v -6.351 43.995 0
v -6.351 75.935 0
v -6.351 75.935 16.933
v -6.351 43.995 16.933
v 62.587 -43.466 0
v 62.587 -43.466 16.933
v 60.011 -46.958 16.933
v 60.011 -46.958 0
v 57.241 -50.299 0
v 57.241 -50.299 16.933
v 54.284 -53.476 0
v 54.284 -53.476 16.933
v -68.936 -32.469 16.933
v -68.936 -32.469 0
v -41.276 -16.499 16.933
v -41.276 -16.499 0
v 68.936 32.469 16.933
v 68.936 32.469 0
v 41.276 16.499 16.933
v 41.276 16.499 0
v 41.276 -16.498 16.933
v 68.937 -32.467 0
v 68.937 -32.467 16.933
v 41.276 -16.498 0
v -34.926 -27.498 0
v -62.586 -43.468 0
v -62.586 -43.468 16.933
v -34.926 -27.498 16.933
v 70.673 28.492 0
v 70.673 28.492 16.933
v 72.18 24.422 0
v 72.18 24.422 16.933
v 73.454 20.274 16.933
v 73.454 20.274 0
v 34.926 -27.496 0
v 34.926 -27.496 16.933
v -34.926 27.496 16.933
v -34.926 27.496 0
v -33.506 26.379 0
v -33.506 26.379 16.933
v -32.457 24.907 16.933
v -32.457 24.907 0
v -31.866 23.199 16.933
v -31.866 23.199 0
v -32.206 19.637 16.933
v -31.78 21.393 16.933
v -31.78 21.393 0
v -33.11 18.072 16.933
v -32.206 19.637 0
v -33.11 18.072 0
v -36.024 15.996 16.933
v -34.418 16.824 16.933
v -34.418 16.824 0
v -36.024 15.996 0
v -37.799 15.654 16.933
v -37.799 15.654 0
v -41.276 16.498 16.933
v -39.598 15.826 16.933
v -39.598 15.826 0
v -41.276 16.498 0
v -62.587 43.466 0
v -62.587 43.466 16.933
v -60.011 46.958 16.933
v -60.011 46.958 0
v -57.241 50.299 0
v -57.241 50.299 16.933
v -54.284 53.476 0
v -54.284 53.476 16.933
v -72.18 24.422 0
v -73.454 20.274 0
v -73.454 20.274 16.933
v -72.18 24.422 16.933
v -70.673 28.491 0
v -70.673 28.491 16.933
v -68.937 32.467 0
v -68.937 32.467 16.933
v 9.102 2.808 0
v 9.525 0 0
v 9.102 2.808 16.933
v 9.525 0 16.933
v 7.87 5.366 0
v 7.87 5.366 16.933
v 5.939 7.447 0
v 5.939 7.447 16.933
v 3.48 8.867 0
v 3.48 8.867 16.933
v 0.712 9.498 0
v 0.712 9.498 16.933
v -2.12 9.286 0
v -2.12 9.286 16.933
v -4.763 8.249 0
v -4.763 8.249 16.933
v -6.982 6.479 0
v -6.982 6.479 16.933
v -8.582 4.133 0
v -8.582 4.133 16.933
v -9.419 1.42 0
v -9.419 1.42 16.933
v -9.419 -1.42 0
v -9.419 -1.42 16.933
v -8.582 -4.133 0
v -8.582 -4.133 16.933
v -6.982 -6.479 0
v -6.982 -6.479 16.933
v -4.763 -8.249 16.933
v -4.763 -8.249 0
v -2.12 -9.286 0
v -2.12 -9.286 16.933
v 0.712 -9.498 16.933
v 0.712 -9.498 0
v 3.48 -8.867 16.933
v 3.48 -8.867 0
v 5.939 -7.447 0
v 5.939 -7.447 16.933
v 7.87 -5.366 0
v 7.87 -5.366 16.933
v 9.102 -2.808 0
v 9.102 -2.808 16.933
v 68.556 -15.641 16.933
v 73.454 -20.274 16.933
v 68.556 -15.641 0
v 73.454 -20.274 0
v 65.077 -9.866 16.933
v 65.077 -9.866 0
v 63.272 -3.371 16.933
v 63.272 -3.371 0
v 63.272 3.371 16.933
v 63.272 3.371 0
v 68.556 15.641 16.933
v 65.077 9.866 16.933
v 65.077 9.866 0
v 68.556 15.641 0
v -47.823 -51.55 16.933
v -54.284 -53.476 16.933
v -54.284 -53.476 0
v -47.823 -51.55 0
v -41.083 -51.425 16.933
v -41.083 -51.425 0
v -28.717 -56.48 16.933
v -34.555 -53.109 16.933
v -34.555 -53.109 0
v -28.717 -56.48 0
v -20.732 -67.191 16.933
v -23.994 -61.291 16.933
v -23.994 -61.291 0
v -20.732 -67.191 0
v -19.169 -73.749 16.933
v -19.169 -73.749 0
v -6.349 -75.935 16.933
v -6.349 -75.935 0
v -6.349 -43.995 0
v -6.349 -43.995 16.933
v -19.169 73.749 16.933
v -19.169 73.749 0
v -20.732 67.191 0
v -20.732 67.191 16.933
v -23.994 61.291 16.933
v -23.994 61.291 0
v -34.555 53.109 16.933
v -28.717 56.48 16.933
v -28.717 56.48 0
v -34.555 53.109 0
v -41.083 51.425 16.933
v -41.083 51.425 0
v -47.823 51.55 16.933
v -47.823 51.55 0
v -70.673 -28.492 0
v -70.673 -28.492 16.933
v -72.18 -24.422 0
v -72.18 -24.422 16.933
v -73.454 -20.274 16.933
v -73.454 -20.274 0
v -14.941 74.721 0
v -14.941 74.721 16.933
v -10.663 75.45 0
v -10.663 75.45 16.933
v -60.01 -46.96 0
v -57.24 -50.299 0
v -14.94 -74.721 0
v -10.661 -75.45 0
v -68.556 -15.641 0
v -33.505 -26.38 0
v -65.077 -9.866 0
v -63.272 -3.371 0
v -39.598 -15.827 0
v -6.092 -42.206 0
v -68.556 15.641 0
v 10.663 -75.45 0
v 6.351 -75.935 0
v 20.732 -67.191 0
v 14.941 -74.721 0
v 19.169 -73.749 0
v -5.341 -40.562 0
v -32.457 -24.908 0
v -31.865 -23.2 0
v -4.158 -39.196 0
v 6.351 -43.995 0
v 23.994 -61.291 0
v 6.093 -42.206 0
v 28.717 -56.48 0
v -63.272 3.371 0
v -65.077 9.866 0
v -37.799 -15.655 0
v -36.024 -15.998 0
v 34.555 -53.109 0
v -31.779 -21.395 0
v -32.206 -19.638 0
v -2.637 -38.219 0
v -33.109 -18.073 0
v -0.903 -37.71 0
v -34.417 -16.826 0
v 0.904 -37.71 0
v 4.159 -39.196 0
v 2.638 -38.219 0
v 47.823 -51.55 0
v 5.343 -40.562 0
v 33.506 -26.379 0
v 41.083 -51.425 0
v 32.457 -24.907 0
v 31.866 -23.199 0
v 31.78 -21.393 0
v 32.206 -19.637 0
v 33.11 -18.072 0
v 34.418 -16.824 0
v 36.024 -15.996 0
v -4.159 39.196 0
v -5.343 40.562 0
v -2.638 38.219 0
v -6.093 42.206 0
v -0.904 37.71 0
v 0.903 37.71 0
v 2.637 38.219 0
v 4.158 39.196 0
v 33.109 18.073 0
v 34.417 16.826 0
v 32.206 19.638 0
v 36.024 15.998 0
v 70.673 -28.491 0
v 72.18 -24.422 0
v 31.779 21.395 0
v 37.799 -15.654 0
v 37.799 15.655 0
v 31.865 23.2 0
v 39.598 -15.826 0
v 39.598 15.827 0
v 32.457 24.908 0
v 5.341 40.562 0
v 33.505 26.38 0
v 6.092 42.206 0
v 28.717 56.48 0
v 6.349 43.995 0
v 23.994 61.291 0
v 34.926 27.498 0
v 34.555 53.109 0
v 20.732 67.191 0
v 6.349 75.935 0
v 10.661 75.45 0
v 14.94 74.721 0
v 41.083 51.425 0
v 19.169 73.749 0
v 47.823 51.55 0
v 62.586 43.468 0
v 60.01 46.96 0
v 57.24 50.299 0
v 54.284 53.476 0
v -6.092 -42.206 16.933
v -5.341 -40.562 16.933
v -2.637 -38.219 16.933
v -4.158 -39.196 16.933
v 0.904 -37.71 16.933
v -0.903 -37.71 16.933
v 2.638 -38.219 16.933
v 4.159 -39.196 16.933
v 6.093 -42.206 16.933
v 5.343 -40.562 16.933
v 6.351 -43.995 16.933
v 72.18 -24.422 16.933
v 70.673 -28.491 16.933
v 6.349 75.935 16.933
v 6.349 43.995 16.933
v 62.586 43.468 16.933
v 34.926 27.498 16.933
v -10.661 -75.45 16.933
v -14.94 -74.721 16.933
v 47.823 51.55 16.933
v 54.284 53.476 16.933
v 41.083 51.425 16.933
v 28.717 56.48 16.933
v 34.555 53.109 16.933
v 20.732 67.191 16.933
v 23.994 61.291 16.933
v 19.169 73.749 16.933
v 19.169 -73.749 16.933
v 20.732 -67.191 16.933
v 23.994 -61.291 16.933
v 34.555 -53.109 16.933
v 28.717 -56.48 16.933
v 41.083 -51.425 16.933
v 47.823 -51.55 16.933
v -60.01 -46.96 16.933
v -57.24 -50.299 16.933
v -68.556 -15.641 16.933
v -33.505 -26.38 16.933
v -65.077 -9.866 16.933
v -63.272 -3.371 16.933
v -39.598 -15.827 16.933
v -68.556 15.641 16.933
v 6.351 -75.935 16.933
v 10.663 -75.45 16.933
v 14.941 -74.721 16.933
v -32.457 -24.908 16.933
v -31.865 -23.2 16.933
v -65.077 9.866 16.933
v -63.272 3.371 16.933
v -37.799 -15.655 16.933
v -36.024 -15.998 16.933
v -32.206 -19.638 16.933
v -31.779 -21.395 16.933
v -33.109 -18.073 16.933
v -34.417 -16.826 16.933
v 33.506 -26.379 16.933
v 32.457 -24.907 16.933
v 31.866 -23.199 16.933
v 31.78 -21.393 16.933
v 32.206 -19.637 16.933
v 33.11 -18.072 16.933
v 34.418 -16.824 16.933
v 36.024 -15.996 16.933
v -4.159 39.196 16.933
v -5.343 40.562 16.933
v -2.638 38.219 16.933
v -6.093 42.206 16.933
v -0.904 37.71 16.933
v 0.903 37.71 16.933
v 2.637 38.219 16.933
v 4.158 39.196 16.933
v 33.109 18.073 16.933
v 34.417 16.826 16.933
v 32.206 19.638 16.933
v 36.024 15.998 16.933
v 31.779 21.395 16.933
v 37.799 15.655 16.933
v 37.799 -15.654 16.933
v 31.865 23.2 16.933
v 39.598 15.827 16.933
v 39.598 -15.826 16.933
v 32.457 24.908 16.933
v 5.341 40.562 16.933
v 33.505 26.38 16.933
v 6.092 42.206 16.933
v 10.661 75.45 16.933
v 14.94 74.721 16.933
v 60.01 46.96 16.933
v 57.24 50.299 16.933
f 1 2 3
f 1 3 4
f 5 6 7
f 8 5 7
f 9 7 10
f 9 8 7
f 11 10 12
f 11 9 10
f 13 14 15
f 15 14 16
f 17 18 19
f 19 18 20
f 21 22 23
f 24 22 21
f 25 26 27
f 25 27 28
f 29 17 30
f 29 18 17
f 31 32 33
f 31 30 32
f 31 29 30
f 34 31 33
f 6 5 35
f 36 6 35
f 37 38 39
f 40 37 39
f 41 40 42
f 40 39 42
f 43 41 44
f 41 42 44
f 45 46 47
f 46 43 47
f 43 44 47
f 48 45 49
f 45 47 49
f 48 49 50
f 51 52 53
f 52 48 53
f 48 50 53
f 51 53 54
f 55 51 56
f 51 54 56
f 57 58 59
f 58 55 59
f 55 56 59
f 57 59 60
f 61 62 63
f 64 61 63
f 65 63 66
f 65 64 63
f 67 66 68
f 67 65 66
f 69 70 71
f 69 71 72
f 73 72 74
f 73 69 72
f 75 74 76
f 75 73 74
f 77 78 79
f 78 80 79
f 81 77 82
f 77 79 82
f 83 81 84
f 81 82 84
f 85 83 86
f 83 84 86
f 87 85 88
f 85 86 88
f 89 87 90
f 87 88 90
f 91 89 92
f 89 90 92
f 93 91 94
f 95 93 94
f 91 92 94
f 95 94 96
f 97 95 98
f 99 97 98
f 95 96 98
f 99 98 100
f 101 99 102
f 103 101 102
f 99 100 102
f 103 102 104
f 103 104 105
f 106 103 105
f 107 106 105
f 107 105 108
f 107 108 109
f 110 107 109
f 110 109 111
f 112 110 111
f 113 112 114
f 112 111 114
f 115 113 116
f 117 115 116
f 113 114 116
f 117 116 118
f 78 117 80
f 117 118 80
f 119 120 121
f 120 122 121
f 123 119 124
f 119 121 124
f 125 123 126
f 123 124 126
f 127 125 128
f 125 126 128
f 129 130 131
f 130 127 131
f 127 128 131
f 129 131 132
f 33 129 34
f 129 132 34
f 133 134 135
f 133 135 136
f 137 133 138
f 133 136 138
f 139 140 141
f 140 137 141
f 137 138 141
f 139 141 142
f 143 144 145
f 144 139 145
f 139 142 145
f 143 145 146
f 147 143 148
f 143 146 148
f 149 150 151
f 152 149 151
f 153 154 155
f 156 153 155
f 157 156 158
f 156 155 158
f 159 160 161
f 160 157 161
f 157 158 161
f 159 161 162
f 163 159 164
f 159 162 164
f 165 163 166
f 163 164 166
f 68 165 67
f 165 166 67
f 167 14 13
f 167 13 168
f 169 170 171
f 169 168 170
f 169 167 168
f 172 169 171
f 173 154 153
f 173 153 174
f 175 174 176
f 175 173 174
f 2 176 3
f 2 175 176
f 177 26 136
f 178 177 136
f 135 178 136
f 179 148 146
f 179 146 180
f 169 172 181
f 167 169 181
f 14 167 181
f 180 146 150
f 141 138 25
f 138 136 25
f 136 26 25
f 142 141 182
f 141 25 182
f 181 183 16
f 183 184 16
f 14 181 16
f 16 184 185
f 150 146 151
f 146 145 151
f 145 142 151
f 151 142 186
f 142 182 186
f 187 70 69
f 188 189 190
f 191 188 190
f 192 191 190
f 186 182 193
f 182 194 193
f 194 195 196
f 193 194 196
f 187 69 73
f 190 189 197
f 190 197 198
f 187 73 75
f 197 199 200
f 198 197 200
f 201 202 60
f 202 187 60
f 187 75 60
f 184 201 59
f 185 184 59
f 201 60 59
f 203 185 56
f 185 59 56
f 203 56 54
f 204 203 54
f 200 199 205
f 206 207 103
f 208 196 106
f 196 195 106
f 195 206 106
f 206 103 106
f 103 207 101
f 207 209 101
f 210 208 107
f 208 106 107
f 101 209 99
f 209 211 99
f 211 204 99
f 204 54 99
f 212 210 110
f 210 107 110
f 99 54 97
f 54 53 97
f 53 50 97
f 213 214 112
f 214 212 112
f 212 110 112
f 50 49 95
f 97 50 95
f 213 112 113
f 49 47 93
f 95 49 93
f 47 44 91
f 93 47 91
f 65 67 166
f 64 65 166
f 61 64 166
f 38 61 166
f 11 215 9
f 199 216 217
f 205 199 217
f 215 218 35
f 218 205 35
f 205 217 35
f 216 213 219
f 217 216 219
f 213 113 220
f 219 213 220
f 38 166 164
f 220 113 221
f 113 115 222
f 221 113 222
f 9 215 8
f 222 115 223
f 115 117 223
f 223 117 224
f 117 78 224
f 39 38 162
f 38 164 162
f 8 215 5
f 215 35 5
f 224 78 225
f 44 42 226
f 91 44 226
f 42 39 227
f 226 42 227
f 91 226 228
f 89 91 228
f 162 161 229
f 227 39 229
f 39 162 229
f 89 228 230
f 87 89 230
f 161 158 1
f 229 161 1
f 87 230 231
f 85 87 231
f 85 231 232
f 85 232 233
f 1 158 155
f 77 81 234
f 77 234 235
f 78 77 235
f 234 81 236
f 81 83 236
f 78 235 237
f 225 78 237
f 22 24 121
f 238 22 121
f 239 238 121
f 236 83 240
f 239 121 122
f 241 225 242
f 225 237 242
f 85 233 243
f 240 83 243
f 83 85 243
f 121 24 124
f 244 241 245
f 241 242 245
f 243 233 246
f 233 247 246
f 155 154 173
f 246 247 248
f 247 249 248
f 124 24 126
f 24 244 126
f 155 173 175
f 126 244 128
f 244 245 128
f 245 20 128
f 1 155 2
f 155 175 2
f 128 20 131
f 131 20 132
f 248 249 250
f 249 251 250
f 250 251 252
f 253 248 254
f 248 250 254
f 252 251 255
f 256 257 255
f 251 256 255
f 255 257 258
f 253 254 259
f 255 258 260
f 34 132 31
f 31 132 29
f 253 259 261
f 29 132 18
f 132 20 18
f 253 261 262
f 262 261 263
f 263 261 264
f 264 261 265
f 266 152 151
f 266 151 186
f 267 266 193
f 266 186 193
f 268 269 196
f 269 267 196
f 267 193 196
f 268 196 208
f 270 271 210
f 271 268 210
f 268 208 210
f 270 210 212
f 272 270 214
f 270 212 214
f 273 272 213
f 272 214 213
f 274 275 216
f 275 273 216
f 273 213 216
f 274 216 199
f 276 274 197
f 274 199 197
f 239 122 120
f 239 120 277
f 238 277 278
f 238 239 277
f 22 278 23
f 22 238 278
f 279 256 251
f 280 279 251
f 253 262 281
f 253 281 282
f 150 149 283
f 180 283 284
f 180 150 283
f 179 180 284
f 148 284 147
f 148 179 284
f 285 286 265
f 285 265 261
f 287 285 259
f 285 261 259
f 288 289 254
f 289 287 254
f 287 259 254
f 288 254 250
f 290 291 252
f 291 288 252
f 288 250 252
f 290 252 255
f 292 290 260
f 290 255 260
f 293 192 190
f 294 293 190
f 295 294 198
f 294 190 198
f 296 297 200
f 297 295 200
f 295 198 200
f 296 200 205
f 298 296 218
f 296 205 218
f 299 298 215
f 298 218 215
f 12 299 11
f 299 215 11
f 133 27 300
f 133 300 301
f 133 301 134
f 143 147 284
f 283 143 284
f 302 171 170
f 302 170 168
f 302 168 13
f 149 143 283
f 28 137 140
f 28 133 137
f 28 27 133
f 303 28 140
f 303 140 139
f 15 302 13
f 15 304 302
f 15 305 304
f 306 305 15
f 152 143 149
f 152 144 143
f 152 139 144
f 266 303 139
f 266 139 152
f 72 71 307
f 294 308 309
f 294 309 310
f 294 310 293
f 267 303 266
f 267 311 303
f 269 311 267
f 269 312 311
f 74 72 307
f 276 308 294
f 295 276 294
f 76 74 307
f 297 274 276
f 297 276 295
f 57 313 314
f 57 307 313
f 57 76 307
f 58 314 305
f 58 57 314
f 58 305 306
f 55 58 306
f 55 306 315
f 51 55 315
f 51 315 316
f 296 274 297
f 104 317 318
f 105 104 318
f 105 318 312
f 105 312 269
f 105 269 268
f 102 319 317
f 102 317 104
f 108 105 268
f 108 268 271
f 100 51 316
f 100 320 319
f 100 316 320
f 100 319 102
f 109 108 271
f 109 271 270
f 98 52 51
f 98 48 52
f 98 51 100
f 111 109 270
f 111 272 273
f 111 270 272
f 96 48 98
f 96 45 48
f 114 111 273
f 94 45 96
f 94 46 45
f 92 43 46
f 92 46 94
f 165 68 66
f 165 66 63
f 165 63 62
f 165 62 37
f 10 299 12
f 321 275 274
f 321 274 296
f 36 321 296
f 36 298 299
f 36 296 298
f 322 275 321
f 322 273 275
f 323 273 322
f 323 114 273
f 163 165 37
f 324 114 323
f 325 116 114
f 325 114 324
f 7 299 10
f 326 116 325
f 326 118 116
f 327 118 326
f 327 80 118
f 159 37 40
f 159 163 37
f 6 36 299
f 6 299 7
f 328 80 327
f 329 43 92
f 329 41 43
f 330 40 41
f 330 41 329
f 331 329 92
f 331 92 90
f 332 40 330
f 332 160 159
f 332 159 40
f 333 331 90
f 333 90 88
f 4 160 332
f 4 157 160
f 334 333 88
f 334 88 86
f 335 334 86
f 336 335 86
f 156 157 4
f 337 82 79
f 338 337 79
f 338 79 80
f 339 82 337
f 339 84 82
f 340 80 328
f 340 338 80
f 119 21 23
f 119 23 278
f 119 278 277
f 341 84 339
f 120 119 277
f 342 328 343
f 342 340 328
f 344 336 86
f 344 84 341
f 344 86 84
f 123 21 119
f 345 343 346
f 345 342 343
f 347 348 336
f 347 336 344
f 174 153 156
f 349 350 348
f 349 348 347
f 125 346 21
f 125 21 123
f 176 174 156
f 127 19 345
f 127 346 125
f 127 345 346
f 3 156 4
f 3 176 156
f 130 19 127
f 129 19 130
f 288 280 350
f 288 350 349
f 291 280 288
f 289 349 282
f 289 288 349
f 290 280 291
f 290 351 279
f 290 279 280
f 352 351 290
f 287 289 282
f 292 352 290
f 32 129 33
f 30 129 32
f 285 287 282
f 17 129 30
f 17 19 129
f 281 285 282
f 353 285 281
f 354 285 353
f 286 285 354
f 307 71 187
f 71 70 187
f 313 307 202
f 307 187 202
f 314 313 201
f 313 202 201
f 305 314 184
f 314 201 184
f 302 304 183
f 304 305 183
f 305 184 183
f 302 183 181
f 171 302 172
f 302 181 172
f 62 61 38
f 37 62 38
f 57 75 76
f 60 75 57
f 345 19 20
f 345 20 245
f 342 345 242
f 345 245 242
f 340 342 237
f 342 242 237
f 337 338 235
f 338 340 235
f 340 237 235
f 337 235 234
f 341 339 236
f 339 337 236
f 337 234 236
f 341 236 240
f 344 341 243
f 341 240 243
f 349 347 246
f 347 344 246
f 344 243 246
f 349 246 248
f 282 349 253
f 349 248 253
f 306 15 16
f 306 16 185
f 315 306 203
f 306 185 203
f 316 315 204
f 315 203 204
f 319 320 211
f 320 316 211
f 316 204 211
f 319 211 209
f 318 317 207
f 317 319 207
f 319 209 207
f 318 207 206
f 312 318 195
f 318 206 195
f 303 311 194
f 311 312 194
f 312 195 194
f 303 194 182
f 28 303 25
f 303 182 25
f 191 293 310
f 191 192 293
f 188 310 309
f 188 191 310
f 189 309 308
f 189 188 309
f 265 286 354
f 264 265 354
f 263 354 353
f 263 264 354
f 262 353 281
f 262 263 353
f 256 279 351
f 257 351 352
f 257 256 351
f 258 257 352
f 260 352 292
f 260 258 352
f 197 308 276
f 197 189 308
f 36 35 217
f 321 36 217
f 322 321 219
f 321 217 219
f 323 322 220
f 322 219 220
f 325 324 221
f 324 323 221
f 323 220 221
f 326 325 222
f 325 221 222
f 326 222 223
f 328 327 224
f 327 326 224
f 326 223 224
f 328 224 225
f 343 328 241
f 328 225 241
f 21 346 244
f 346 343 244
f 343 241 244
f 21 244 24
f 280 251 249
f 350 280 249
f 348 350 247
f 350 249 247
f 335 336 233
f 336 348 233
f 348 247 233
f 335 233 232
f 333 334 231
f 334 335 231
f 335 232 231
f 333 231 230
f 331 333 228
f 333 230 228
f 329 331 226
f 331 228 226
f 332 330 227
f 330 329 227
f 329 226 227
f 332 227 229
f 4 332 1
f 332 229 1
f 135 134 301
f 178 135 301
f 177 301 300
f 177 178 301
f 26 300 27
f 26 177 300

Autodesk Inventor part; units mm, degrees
ref_plane "YZ Plane" through (0, 0, 0) normal (1, 0, 0) x (0, 1, 0)
ref_plane "XZ Plane" through (0, 0, 0) normal (0, 1, 0) x (-1, 0, 0)
ref_plane "XY Plane" through (0, 0, 0) normal (0, 0, 1) x (1, 0, 0)
sketch "Sketch2" plane through (0, 0, 0) normal (0, 0, 1) x (1, 0, 0)
  line L0 (0, 0) -> (87.9881, 0) construction
  line L1 (0, 0) -> (65.9905, 38.1011) construction
  line L2 (65.9905, 38.1011) -> (87.9881, 0) construction
  circle A0 centre (0, 0) radius 76.2 construction
  line L3 (62.5859, 43.4678) -> (34.9256, 27.4975)
  line L4 (68.9361, 32.4694) -> (41.2758, 16.4991)
  arc A1 (34.9256, 27.4975) -> (41.2758, 16.4991) centre (38.1007, 21.9983) ccw
  arc A2 (73.4536, 20.2735) -> (73.4536, -20.2735) centre (87.9881, 0) ccw
  arc A3 (73.4536, 20.2735) -> (68.9361, 32.4694) centre (0, 0) ccw
  line L5 (62.5873, -43.4657) -> (34.9265, -27.4963)
  arc A4 (41.2764, -16.4977) -> (34.9265, -27.4963) centre (38.1014, -21.997) ccw
  line L6 (68.9371, -32.4671) -> (41.2764, -16.4977)
  arc A5 (54.2842, -53.4759) -> (62.5873, -43.4657) centre (0, 0) ccw
  arc A6 (54.2842, -53.4759) -> (19.1694, -73.7494) centre (43.9941, -76.2) ccw
  line L7 (-6.3487, -75.9351) -> (-6.3493, -43.9954)
  arc A7 (6.3507, -43.9952) -> (-6.3493, -43.9954) centre (0.0007, -43.9953) ccw
  line L8 (6.3513, -75.9348) -> (6.3507, -43.9952)
  arc A8 (-19.1694, -73.7494) -> (-6.3487, -75.9351) centre (0, 0) ccw
  arc A9 (-19.1694, -73.7494) -> (-54.2842, -53.4759) centre (-43.9941, -76.2) ccw
  line L9 (-68.9361, -32.4694) -> (-41.2758, -16.4991)
  arc A10 (-34.9256, -27.4975) -> (-41.2758, -16.4991) centre (-38.1007, -21.9983) ccw
  line L10 (-62.5859, -43.4678) -> (-34.9256, -27.4975)
  arc A11 (-73.4536, -20.2735) -> (-68.9361, -32.4694) centre (0, 0) ccw
  arc A12 (-73.4536, -20.2735) -> (-73.4536, 20.2735) centre (-87.9881, 0) ccw
  line L11 (-62.5873, 43.4657) -> (-34.9265, 27.4963)
  arc A13 (-41.2764, 16.4977) -> (-34.9265, 27.4963) centre (-38.1014, 21.997) ccw
  line L12 (-68.9371, 32.4671) -> (-41.2764, 16.4977)
  arc A14 (-54.2842, 53.4759) -> (-62.5873, 43.4657) centre (0, 0) ccw
  arc A15 (-54.2842, 53.4759) -> (-19.1694, 73.7494) centre (-43.9941, 76.2) ccw
  line L13 (6.3487, 75.9351) -> (6.3493, 43.9954)
  arc A16 (-6.3507, 43.9952) -> (6.3493, 43.9954) centre (-0.0007, 43.9953) ccw
  line L14 (-6.3513, 75.9348) -> (-6.3507, 43.9952)
  arc A17 (19.1694, 73.7494) -> (6.3487, 75.9351) centre (0, 0) ccw
  arc A18 (19.1694, 73.7494) -> (54.2842, 53.4759) centre (43.9941, 76.2) ccw
  arc A19 (62.5859, 43.4678) -> (54.2842, 53.4759) centre (0, 0) ccw
  arc A20 (-6.3513, 75.9348) -> (-19.1694, 73.7494) centre (0, 0) ccw
  arc A21 (-68.9371, 32.4671) -> (-73.4536, 20.2735) centre (0, 0) ccw
  arc A22 (-62.5859, -43.4678) -> (-54.2842, -53.4759) centre (0, 0) ccw
  arc A23 (6.3513, -75.9348) -> (19.1694, -73.7494) centre (0, 0) ccw
  arc A24 (68.9371, -32.4671) -> (73.4536, -20.2735) centre (0, 0) ccw
  dimension "d6" = 87.9881
  dimension "d7" = 43.9953
  dimension "d8" = 76.2
  dimension "d9" = 12.7
  dimension "d10" = 32.2047
  dimension "d12" = 24.9453
  dimension "d15" = 360
extrude "Extrusion1" add sketch "Sketch2" along normal blind 16.9333
sketch "Sketch3" plane through (0, 0, 16.9333) normal (0, 0, 1) x (1, 0, 0)
  circle A0 centre (0, 0) radius 9.525
  dimension "d19" = 19.05
extrude "Extrusion2" cut sketch "Sketch3" against normal through all
properties part number "Geneva Driven"
